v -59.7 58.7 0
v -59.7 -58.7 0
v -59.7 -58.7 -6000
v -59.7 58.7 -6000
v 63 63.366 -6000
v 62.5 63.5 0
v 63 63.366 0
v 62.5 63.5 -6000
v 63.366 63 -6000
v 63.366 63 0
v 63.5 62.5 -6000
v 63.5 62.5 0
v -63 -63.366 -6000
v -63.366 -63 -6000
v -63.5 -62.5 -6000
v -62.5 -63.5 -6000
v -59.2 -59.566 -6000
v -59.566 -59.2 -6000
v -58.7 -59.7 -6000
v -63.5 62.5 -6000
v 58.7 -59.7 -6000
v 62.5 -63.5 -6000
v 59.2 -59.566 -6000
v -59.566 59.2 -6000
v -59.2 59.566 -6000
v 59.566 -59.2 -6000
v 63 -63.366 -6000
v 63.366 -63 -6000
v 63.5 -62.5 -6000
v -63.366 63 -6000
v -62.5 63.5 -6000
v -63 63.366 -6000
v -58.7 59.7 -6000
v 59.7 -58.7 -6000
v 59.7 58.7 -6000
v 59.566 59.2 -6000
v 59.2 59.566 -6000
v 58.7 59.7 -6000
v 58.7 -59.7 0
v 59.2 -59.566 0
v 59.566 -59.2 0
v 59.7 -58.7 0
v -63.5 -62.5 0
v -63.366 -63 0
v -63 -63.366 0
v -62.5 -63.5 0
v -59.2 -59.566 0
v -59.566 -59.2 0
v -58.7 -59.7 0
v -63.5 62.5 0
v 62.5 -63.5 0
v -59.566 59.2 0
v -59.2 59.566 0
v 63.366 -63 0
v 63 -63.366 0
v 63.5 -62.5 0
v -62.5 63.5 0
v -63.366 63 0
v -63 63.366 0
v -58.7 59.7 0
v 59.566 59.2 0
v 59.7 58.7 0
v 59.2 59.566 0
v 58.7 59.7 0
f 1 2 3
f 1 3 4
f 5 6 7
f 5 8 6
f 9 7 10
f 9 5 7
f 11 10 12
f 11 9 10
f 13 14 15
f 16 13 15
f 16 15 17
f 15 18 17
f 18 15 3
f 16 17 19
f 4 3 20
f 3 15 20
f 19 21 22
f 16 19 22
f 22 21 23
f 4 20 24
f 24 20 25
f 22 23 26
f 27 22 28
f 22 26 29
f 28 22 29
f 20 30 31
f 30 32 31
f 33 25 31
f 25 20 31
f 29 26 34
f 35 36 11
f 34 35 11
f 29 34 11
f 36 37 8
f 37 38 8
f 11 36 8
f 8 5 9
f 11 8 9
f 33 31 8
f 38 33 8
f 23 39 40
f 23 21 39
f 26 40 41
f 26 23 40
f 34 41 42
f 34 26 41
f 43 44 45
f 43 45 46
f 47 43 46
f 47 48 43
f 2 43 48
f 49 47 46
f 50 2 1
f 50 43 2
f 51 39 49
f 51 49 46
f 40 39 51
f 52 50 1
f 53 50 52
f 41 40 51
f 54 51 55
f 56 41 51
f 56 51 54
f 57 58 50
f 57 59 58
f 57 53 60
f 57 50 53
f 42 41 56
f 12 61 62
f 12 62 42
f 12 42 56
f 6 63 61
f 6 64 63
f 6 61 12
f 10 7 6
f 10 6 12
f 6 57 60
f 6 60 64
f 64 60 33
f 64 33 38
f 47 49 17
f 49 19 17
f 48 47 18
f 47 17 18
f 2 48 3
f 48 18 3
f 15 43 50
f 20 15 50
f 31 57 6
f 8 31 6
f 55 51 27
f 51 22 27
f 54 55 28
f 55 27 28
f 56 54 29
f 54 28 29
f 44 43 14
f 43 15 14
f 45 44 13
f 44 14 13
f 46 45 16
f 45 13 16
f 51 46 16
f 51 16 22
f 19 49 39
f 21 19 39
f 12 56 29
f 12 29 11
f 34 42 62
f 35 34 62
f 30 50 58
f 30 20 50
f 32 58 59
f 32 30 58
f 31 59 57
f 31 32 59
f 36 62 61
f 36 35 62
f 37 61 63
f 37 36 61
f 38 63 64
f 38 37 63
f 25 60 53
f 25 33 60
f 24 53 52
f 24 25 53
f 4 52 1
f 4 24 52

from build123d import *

# Parameters (mm, degrees)
CROQUIS1_W              = 127
CROQUIS1_H              = 127
CROQUIS1_W_2            = 119.4
CROQUIS1_H_2            = 119.4
SALIENTE_EXTRUIR1_DEPTH = 6000
REDONDEO1_R             = 1


with BuildPart() as part:
    # Croquis1 → Saliente-Extruir1 (new body)
    with BuildSketch(Plane.XY):
        Rectangle(CROQUIS1_W, CROQUIS1_H)
        Rectangle(CROQUIS1_W_2, CROQUIS1_H_2, mode=Mode.SUBTRACT)
    extrude(amount=-SALIENTE_EXTRUIR1_DEPTH)

    # Redondeo1
    redondeo1_edges = [part.edges().sort_by_distance(p)[0] for p in [
        (59.7, -59.7, -3000),
        (-59.7, -59.7, -3000),
        (-59.7, 59.7, -3000),
        (59.7, 59.7, -3000),
        (63.5, -63.5, -3000),
        (-63.5, -63.5, -3000),
        (-63.5, 63.5, -3000),
        (63.5, 63.5, -3000),
    ]]
    fillet(redondeo1_edges, radius=REDONDEO1_R)


solid = part.part
